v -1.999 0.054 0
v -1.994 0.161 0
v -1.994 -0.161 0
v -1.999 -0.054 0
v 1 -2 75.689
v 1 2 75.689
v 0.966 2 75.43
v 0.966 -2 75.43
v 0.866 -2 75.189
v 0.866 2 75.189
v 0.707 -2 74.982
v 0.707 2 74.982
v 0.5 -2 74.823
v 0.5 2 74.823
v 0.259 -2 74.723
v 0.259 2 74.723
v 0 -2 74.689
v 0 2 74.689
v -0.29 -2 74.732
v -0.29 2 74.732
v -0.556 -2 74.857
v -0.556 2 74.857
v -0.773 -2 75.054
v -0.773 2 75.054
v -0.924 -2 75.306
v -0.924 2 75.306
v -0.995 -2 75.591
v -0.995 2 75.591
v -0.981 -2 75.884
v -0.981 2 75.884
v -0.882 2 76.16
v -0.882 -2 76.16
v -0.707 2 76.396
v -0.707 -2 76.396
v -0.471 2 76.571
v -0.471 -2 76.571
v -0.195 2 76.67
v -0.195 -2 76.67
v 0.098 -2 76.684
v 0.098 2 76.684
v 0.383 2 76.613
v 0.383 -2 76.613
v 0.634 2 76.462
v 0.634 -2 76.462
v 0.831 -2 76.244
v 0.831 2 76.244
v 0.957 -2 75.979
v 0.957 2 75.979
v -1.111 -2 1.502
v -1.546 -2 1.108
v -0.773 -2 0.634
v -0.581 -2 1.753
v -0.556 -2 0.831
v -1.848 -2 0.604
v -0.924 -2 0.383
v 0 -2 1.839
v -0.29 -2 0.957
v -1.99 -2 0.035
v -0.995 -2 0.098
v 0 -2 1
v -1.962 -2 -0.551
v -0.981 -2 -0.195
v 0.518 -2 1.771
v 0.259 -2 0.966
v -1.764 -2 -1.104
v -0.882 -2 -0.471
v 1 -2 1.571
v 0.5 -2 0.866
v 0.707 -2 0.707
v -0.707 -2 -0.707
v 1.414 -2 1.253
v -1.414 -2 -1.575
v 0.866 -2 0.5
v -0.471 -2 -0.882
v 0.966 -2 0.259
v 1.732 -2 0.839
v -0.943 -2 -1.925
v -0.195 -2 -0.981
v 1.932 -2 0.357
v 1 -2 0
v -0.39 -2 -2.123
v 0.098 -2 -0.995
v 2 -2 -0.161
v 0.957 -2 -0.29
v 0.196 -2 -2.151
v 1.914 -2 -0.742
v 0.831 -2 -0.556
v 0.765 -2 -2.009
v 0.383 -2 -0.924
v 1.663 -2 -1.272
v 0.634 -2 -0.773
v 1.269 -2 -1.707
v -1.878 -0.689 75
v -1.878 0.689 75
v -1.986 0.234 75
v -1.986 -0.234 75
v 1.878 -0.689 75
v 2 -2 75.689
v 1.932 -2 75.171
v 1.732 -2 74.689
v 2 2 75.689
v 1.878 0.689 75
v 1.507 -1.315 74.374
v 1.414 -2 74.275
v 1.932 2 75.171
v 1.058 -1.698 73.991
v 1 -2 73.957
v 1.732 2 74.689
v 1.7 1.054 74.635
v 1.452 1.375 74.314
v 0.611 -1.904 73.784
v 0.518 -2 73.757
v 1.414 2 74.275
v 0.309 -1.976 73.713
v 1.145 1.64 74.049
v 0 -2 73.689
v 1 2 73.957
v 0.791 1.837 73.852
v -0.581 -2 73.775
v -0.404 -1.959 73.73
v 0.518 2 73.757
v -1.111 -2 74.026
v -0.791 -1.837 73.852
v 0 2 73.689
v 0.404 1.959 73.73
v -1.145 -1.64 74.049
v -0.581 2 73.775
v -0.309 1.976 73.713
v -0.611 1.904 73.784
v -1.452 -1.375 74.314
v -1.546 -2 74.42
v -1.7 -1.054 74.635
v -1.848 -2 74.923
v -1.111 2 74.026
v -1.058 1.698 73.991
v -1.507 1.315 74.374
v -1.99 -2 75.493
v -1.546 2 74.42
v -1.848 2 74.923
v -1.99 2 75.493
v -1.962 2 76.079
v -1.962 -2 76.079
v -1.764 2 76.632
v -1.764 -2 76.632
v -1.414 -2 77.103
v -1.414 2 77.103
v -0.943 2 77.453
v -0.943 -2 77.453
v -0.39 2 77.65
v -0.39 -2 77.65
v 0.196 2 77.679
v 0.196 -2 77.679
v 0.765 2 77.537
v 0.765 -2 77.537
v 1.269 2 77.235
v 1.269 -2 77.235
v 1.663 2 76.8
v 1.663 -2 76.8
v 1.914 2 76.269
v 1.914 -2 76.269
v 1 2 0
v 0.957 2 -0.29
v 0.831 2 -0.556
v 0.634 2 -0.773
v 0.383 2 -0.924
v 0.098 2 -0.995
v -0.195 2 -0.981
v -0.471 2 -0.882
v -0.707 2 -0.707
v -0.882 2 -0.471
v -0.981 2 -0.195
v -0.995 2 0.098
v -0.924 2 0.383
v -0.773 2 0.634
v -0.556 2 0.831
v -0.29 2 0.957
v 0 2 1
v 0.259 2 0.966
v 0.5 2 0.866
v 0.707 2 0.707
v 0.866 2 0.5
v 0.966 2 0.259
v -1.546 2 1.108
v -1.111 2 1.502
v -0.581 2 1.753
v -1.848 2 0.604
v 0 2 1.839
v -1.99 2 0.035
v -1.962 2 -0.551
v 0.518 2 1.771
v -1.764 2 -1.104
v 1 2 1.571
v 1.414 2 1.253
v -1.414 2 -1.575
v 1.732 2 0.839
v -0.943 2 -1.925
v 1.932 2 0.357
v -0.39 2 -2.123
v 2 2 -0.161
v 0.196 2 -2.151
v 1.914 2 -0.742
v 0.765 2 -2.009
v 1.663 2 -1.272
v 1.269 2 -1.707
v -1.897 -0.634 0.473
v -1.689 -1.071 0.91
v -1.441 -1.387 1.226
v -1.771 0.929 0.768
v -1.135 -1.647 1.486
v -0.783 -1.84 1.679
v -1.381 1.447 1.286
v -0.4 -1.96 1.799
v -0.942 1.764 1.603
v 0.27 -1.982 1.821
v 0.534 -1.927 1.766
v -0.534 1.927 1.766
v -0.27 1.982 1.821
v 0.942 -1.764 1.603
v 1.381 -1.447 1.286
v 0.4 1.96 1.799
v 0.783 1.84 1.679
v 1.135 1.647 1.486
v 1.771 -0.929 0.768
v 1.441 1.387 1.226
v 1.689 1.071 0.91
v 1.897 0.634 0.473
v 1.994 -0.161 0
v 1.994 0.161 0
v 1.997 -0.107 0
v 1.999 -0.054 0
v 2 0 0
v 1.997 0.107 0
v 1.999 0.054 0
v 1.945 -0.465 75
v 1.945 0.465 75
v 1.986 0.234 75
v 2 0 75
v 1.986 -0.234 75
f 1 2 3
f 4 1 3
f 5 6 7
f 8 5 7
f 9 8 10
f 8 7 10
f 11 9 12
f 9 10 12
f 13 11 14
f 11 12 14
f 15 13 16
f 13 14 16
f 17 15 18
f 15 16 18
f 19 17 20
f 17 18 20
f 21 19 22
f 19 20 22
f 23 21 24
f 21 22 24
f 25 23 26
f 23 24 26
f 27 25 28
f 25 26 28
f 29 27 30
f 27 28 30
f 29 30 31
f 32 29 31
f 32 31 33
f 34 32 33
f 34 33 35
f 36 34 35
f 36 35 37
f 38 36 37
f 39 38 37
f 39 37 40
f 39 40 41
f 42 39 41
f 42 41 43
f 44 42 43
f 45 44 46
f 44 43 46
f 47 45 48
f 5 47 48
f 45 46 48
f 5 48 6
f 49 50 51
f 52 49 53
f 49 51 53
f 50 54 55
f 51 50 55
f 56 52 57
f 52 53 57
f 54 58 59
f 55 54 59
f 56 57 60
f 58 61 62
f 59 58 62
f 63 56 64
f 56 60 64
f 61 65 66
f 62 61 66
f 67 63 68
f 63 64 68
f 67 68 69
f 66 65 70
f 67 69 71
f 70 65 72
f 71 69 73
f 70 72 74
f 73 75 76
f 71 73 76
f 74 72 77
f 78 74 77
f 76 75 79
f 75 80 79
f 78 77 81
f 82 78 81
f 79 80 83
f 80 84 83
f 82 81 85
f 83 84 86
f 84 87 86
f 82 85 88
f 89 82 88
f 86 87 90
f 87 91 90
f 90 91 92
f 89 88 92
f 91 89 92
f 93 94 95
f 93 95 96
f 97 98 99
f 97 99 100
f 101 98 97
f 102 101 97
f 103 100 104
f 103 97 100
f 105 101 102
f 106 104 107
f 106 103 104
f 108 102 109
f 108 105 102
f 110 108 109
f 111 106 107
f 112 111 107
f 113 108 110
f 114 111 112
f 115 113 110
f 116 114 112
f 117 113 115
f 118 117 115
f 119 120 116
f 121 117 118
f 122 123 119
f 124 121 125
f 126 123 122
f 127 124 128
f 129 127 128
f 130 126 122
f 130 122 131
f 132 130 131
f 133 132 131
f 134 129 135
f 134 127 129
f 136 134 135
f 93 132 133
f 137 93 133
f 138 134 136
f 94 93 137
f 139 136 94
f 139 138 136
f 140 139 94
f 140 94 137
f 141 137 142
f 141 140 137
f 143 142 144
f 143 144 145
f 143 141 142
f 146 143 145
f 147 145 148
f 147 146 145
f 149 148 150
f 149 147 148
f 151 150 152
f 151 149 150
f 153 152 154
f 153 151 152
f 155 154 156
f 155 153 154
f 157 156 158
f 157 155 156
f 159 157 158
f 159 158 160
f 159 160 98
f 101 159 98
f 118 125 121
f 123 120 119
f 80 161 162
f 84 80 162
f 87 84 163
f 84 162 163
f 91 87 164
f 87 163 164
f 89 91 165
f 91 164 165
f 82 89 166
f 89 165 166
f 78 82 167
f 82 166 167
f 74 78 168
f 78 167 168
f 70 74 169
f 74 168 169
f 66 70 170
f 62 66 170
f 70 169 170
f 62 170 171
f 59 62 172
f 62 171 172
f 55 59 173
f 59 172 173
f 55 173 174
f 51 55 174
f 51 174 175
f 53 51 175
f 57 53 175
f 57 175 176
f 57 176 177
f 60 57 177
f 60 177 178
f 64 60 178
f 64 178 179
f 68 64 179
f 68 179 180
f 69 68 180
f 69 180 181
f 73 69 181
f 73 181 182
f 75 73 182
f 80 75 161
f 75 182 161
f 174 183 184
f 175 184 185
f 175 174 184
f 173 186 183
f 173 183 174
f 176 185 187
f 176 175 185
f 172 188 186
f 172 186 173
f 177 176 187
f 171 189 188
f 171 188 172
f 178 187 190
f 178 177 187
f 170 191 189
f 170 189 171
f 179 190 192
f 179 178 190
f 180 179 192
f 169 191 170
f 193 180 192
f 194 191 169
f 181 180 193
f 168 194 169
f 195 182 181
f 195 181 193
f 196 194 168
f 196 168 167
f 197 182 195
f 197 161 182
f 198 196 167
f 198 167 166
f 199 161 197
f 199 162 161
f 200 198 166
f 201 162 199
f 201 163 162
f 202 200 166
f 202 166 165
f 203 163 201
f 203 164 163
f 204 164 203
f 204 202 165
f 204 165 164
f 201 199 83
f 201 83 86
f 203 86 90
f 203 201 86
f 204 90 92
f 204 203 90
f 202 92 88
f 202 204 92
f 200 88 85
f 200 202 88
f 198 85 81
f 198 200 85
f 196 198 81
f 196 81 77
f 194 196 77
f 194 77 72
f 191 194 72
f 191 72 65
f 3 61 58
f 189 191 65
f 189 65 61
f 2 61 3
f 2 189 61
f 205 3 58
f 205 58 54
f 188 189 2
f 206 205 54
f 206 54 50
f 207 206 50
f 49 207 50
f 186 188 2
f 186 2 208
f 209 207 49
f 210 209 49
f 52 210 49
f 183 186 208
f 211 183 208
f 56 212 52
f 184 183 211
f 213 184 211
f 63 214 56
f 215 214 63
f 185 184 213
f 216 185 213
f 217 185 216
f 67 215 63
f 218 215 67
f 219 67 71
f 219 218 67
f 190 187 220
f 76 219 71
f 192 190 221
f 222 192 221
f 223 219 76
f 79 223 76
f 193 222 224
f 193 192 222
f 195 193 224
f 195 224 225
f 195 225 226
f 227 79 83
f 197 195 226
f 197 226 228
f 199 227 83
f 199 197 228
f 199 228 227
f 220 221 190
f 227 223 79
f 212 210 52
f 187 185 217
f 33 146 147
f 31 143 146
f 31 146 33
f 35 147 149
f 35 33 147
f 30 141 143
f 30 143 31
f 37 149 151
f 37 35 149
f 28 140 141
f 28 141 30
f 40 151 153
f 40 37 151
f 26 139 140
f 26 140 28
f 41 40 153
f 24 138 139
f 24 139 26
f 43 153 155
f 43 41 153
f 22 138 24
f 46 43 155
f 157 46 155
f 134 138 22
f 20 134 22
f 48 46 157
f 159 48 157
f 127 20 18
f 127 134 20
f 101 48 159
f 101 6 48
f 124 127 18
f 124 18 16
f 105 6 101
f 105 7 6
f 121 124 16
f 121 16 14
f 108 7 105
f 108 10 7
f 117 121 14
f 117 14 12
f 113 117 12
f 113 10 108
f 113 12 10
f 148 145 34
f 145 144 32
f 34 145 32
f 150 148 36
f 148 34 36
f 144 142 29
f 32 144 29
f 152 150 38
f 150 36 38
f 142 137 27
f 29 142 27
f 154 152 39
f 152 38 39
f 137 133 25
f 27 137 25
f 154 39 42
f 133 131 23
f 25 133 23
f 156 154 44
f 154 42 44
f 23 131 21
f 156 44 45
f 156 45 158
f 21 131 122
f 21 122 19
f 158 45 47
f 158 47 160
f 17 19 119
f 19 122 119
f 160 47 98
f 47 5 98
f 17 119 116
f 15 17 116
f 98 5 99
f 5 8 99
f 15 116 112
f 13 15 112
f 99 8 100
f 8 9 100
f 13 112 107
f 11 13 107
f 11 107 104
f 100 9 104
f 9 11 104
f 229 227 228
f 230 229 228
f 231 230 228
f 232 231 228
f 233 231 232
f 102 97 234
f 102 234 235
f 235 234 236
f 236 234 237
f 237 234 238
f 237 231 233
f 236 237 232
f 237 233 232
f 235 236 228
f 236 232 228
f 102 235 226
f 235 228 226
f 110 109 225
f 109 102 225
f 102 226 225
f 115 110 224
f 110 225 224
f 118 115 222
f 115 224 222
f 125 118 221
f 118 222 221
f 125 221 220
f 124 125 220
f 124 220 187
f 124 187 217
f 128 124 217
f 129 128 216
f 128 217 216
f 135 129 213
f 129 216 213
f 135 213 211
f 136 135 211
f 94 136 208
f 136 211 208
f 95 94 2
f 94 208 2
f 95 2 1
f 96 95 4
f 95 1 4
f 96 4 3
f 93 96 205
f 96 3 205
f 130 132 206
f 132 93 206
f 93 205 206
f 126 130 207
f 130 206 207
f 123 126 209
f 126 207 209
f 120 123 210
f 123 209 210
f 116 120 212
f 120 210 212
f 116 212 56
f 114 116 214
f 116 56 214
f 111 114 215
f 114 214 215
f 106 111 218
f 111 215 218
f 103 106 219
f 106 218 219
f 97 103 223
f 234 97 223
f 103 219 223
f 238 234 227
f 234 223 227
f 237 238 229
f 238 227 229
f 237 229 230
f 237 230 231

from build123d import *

# Parameters (mm, degrees)
SKIZZE1_R                       = 2
AUFSATZ_LINEAR_AUSTRAGEN1_DEPTH = 75
AUFSATZ_LINEAR_START            = 2
SKIZZE2_R                       = 2
AUFSATZ_LINEAR_AUSTRAGEN2_DEPTH = 4
SKIZZE3_R                       = 1
SCHNITT_LINEAR_AUSTRAGEN1_DEPTH = 4


with BuildPart() as part:
    # Skizze1 → Aufsatz-Linear austragen1 (new body)
    with BuildSketch(Plane.XY):
        Circle(SKIZZE1_R)
    extrude(amount=AUFSATZ_LINEAR_AUSTRAGEN1_DEPTH)

    # Skizze2 → Aufsatz-Linear austragen2 (add)
    with BuildSketch(Plane(origin=(0, 0, 0), x_dir=(1, 0, 0), z_dir=(0, 1, 0)).offset(AUFSATZ_LINEAR_START)):
        with Locations((0, -75.688838901)):
            Circle(SKIZZE2_R)
        with Locations((0, 0.161056254)):
            Circle(SKIZZE2_R)
    extrude(amount=-AUFSATZ_LINEAR_AUSTRAGEN2_DEPTH)

    # Skizze3 → Schnitt-Linear austragen1 (cut)
    with BuildSketch(Plane(origin=(0, 2, 0), x_dir=(1, 0, 0), z_dir=(0, 1, 0))):
        with Locations((0, -75.688838901)):
            Circle(SKIZZE3_R)
        Circle(SKIZZE3_R)
    extrude(amount=-SCHNITT_LINEAR_AUSTRAGEN1_DEPTH, mode=Mode.SUBTRACT)


solid = part.part
